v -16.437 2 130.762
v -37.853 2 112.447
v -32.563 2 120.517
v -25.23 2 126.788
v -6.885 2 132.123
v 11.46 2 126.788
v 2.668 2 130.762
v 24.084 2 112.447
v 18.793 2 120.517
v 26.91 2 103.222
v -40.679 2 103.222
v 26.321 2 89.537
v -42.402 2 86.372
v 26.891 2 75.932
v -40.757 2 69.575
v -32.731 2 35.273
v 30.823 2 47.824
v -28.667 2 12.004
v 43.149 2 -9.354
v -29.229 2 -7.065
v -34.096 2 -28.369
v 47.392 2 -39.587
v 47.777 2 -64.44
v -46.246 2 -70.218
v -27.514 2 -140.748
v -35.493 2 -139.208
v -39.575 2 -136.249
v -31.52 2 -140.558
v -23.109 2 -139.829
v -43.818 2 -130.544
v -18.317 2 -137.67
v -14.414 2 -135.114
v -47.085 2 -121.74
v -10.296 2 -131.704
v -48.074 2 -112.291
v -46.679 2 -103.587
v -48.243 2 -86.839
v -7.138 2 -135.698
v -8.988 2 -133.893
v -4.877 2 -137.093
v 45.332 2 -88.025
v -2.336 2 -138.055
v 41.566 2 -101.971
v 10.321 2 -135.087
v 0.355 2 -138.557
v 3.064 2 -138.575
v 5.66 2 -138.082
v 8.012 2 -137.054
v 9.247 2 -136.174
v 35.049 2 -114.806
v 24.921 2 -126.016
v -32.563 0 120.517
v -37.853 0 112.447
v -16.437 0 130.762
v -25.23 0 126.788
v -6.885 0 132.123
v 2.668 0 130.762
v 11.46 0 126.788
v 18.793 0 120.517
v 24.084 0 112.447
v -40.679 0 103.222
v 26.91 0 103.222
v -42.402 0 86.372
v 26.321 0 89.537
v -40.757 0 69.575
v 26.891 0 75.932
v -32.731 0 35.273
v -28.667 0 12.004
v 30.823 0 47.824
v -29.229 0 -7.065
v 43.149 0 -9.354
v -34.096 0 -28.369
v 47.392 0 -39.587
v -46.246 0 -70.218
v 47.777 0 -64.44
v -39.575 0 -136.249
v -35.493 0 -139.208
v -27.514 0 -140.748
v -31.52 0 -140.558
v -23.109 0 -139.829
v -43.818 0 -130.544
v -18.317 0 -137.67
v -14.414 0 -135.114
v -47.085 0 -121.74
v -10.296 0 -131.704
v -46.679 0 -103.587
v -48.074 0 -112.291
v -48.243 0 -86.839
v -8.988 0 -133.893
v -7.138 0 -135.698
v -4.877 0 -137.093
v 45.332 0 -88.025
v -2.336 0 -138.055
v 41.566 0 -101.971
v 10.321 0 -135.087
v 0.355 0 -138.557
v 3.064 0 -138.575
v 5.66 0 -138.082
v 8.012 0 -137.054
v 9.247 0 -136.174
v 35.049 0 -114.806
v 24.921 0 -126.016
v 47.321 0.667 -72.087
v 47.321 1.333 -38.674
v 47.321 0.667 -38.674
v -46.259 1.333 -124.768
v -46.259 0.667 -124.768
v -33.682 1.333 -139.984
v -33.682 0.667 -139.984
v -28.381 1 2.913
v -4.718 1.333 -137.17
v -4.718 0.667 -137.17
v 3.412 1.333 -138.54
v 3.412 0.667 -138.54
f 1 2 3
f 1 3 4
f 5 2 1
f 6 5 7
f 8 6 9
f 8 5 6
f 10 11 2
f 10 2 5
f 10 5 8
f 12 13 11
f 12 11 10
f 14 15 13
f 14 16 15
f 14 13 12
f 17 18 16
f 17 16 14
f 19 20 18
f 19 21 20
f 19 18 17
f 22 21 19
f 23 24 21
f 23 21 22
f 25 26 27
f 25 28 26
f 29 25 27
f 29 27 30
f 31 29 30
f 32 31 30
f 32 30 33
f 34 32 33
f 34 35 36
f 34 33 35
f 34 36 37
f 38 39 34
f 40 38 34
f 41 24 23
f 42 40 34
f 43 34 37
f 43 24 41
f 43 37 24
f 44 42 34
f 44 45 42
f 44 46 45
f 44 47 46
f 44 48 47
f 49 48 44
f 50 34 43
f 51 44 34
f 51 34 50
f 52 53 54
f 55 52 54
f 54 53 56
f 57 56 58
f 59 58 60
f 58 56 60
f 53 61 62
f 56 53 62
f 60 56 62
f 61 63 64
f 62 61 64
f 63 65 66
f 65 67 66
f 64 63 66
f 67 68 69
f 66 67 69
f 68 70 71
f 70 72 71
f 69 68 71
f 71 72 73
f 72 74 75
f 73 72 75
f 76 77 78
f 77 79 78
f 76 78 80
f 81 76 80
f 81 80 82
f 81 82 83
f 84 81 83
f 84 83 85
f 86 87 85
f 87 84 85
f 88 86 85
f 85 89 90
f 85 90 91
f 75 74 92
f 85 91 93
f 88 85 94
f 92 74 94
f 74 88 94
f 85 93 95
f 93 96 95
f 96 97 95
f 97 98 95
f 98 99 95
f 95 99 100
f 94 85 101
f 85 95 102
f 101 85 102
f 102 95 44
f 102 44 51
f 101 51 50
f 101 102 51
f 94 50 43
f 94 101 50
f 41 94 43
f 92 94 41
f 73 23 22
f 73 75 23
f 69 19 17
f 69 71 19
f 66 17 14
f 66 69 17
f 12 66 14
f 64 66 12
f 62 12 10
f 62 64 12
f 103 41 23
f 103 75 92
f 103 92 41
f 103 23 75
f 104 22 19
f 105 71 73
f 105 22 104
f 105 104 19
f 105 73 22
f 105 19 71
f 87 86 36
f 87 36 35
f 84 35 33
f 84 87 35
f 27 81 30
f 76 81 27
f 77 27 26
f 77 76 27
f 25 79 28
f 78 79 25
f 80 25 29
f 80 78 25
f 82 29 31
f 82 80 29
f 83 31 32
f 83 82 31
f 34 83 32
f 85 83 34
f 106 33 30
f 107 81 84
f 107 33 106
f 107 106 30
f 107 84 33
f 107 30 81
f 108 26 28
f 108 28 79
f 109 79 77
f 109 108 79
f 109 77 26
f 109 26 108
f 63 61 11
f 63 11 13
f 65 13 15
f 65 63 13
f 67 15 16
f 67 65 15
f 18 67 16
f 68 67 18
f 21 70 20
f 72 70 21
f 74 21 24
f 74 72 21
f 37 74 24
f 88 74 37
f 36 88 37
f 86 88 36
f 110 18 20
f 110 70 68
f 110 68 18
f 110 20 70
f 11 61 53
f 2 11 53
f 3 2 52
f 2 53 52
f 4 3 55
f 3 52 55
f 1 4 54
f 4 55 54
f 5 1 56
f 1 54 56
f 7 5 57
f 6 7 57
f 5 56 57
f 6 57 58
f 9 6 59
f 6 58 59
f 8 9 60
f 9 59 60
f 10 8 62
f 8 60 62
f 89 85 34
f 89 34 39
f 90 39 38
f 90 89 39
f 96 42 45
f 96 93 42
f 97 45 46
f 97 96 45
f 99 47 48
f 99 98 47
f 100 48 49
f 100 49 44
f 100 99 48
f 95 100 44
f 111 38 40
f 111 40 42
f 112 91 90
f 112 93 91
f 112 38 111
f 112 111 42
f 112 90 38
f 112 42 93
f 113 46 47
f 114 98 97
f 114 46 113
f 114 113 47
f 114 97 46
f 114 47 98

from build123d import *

# Parameters (mm, degrees)
BOSS_EXTRUDE1_DEPTH = 2


with BuildPart() as part:
    # Sketch1 → Boss-Extrude1 (new body)
    with BuildSketch(Plane(origin=(0, 0, 0), x_dir=(1, 0, 0), z_dir=(0, 1, 0))):
        with BuildLine():
            ThreePointArc((-40.679244353, -103.221523445), (-6.884583356, -132.122739902), (26.910077355, -103.221523111))
            add(Edge.make_bspline(
                [(10.32075615, 135.087420221), (39.402555208, 121.787875107), (48.095792581, 85.931785161), (48.363582245, 1.743673196), (22.570320599, -55.244701587), (26.910077355, -103.221523111)],
                knots=[0, 0, 0, 0, 0.296821126, 0.429544144, 1, 1, 1, 1], degree=3))
            add(Edge.make_bspline(
                [(-10.296198393, 131.704373688), (-7.252650356, 138.974935501), (5.280450445, 141.193491305), (10.32075615, 135.087420221)],
                knots=[0, 0, 0, 0, 1, 1, 1, 1], degree=3))
            add(Edge.make_bspline(
                [(-46.679244317, 103.587421062), (-52.785760987, 121.907427011), (-38.636955581, 157.574381944), (-10.296198393, 131.704373688)],
                knots=[0, 0, 0, 0, 1, 1, 1, 1], degree=3))
            add(Edge.make_bspline(
                [(-40.679244353, -103.221523445), (-48.424660229, -69.464624821), (-5.31250584, -0.275920012), (-54.797034308, 67.469917015), (-46.679244317, 103.587421062)],
                knots=[0, 0, 0, 0, 0.483382248, 1, 1, 1, 1], degree=3))
        make_face()
    extrude(amount=BOSS_EXTRUDE1_DEPTH)


solid = part.part
